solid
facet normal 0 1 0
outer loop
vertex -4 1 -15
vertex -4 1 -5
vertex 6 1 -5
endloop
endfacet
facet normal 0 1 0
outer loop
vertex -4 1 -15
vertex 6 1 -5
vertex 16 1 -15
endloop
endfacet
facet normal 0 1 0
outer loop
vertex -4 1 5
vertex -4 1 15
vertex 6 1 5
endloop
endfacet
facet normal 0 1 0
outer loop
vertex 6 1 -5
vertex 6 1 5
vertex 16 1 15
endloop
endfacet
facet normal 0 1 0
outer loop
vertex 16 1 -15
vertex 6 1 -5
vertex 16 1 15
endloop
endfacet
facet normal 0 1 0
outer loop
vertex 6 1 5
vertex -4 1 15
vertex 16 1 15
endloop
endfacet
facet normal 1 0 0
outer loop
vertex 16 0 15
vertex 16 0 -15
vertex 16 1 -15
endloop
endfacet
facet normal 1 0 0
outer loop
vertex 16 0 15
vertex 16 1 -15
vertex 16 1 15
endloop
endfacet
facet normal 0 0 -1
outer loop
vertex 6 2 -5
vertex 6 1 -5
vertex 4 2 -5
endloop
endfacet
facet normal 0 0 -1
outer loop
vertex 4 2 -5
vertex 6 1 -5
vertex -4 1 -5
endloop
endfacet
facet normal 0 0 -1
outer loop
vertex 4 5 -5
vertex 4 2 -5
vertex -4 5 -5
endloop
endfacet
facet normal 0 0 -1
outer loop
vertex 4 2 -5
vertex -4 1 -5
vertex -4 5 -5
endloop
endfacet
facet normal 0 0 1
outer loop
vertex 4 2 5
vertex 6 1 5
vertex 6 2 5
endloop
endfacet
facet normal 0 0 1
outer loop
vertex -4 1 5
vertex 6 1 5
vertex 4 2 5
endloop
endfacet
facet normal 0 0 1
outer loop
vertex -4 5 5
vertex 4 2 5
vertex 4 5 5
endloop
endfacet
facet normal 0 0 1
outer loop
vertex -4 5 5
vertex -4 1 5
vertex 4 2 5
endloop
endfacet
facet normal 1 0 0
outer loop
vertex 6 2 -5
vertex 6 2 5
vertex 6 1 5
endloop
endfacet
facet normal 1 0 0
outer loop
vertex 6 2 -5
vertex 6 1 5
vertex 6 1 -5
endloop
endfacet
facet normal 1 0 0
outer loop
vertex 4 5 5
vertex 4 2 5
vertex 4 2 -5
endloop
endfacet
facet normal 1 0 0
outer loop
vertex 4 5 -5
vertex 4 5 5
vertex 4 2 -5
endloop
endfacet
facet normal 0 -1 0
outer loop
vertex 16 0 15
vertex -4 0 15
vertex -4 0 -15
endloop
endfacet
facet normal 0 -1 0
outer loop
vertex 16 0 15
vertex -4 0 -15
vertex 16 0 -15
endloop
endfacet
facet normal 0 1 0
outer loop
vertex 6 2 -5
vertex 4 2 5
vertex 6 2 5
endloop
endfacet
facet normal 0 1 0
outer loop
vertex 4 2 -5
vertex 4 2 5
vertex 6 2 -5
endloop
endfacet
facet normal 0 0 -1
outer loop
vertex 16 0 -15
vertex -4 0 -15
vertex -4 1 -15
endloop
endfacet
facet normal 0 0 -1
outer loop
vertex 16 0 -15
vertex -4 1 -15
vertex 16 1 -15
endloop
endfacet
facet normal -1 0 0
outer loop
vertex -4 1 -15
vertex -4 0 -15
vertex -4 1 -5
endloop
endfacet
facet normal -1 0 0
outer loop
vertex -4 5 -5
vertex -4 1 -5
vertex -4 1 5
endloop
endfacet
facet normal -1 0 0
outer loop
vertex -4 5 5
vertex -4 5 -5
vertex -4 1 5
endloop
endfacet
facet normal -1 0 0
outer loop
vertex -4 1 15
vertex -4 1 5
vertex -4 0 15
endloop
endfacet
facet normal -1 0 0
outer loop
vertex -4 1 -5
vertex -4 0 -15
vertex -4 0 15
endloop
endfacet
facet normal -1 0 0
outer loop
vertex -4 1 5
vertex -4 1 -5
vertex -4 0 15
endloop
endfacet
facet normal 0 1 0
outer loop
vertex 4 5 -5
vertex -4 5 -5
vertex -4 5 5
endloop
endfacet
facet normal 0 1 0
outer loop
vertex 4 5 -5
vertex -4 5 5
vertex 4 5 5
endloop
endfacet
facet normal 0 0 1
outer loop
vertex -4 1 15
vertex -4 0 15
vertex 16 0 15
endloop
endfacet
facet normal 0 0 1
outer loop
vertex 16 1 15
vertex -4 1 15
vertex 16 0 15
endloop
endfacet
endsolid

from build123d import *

# Parameters (mm, degrees)
SCHIZZO1_W                   = 8
SCHIZZO1_H                   = 10
ESTRUSIONE_ESTRUSIONE1_DEPTH = 5
SCHIZZO2_W                   = 10
SCHIZZO2_H                   = 2
ESTRUSIONE_ESTRUSIONE2_DEPTH = 2
SCHIZZO3_W                   = 20
SCHIZZO3_H                   = 30
ESTRUSIONE_ESTRUSIONE3_DEPTH = 1


with BuildPart() as part:
    # Schizzo1 → Estrusione-Estrusione1 (new body)
    with BuildSketch(Plane(origin=(0, 0, 0), x_dir=(1, 0, 0), z_dir=(0, 1, 0))):
        Rectangle(SCHIZZO1_W, SCHIZZO1_H)
    extrude(amount=ESTRUSIONE_ESTRUSIONE1_DEPTH)

    # Schizzo2 → Estrusione-Estrusione2 (add)
    with BuildSketch(Plane(origin=(4, 0, 0), x_dir=(0, 0, -1), z_dir=(1, 0, 0))):
        with Locations((0, 1)):
            Rectangle(SCHIZZO2_W, SCHIZZO2_H)
    extrude(amount=ESTRUSIONE_ESTRUSIONE2_DEPTH)

    # Schizzo3 → Estrusione-Estrusione3 (add)
    with BuildSketch(Plane.XZ):
        with Locations((6, 0)):
            Rectangle(SCHIZZO3_W, SCHIZZO3_H)
    extrude(amount=-ESTRUSIONE_ESTRUSIONE3_DEPTH)


solid = part.part
